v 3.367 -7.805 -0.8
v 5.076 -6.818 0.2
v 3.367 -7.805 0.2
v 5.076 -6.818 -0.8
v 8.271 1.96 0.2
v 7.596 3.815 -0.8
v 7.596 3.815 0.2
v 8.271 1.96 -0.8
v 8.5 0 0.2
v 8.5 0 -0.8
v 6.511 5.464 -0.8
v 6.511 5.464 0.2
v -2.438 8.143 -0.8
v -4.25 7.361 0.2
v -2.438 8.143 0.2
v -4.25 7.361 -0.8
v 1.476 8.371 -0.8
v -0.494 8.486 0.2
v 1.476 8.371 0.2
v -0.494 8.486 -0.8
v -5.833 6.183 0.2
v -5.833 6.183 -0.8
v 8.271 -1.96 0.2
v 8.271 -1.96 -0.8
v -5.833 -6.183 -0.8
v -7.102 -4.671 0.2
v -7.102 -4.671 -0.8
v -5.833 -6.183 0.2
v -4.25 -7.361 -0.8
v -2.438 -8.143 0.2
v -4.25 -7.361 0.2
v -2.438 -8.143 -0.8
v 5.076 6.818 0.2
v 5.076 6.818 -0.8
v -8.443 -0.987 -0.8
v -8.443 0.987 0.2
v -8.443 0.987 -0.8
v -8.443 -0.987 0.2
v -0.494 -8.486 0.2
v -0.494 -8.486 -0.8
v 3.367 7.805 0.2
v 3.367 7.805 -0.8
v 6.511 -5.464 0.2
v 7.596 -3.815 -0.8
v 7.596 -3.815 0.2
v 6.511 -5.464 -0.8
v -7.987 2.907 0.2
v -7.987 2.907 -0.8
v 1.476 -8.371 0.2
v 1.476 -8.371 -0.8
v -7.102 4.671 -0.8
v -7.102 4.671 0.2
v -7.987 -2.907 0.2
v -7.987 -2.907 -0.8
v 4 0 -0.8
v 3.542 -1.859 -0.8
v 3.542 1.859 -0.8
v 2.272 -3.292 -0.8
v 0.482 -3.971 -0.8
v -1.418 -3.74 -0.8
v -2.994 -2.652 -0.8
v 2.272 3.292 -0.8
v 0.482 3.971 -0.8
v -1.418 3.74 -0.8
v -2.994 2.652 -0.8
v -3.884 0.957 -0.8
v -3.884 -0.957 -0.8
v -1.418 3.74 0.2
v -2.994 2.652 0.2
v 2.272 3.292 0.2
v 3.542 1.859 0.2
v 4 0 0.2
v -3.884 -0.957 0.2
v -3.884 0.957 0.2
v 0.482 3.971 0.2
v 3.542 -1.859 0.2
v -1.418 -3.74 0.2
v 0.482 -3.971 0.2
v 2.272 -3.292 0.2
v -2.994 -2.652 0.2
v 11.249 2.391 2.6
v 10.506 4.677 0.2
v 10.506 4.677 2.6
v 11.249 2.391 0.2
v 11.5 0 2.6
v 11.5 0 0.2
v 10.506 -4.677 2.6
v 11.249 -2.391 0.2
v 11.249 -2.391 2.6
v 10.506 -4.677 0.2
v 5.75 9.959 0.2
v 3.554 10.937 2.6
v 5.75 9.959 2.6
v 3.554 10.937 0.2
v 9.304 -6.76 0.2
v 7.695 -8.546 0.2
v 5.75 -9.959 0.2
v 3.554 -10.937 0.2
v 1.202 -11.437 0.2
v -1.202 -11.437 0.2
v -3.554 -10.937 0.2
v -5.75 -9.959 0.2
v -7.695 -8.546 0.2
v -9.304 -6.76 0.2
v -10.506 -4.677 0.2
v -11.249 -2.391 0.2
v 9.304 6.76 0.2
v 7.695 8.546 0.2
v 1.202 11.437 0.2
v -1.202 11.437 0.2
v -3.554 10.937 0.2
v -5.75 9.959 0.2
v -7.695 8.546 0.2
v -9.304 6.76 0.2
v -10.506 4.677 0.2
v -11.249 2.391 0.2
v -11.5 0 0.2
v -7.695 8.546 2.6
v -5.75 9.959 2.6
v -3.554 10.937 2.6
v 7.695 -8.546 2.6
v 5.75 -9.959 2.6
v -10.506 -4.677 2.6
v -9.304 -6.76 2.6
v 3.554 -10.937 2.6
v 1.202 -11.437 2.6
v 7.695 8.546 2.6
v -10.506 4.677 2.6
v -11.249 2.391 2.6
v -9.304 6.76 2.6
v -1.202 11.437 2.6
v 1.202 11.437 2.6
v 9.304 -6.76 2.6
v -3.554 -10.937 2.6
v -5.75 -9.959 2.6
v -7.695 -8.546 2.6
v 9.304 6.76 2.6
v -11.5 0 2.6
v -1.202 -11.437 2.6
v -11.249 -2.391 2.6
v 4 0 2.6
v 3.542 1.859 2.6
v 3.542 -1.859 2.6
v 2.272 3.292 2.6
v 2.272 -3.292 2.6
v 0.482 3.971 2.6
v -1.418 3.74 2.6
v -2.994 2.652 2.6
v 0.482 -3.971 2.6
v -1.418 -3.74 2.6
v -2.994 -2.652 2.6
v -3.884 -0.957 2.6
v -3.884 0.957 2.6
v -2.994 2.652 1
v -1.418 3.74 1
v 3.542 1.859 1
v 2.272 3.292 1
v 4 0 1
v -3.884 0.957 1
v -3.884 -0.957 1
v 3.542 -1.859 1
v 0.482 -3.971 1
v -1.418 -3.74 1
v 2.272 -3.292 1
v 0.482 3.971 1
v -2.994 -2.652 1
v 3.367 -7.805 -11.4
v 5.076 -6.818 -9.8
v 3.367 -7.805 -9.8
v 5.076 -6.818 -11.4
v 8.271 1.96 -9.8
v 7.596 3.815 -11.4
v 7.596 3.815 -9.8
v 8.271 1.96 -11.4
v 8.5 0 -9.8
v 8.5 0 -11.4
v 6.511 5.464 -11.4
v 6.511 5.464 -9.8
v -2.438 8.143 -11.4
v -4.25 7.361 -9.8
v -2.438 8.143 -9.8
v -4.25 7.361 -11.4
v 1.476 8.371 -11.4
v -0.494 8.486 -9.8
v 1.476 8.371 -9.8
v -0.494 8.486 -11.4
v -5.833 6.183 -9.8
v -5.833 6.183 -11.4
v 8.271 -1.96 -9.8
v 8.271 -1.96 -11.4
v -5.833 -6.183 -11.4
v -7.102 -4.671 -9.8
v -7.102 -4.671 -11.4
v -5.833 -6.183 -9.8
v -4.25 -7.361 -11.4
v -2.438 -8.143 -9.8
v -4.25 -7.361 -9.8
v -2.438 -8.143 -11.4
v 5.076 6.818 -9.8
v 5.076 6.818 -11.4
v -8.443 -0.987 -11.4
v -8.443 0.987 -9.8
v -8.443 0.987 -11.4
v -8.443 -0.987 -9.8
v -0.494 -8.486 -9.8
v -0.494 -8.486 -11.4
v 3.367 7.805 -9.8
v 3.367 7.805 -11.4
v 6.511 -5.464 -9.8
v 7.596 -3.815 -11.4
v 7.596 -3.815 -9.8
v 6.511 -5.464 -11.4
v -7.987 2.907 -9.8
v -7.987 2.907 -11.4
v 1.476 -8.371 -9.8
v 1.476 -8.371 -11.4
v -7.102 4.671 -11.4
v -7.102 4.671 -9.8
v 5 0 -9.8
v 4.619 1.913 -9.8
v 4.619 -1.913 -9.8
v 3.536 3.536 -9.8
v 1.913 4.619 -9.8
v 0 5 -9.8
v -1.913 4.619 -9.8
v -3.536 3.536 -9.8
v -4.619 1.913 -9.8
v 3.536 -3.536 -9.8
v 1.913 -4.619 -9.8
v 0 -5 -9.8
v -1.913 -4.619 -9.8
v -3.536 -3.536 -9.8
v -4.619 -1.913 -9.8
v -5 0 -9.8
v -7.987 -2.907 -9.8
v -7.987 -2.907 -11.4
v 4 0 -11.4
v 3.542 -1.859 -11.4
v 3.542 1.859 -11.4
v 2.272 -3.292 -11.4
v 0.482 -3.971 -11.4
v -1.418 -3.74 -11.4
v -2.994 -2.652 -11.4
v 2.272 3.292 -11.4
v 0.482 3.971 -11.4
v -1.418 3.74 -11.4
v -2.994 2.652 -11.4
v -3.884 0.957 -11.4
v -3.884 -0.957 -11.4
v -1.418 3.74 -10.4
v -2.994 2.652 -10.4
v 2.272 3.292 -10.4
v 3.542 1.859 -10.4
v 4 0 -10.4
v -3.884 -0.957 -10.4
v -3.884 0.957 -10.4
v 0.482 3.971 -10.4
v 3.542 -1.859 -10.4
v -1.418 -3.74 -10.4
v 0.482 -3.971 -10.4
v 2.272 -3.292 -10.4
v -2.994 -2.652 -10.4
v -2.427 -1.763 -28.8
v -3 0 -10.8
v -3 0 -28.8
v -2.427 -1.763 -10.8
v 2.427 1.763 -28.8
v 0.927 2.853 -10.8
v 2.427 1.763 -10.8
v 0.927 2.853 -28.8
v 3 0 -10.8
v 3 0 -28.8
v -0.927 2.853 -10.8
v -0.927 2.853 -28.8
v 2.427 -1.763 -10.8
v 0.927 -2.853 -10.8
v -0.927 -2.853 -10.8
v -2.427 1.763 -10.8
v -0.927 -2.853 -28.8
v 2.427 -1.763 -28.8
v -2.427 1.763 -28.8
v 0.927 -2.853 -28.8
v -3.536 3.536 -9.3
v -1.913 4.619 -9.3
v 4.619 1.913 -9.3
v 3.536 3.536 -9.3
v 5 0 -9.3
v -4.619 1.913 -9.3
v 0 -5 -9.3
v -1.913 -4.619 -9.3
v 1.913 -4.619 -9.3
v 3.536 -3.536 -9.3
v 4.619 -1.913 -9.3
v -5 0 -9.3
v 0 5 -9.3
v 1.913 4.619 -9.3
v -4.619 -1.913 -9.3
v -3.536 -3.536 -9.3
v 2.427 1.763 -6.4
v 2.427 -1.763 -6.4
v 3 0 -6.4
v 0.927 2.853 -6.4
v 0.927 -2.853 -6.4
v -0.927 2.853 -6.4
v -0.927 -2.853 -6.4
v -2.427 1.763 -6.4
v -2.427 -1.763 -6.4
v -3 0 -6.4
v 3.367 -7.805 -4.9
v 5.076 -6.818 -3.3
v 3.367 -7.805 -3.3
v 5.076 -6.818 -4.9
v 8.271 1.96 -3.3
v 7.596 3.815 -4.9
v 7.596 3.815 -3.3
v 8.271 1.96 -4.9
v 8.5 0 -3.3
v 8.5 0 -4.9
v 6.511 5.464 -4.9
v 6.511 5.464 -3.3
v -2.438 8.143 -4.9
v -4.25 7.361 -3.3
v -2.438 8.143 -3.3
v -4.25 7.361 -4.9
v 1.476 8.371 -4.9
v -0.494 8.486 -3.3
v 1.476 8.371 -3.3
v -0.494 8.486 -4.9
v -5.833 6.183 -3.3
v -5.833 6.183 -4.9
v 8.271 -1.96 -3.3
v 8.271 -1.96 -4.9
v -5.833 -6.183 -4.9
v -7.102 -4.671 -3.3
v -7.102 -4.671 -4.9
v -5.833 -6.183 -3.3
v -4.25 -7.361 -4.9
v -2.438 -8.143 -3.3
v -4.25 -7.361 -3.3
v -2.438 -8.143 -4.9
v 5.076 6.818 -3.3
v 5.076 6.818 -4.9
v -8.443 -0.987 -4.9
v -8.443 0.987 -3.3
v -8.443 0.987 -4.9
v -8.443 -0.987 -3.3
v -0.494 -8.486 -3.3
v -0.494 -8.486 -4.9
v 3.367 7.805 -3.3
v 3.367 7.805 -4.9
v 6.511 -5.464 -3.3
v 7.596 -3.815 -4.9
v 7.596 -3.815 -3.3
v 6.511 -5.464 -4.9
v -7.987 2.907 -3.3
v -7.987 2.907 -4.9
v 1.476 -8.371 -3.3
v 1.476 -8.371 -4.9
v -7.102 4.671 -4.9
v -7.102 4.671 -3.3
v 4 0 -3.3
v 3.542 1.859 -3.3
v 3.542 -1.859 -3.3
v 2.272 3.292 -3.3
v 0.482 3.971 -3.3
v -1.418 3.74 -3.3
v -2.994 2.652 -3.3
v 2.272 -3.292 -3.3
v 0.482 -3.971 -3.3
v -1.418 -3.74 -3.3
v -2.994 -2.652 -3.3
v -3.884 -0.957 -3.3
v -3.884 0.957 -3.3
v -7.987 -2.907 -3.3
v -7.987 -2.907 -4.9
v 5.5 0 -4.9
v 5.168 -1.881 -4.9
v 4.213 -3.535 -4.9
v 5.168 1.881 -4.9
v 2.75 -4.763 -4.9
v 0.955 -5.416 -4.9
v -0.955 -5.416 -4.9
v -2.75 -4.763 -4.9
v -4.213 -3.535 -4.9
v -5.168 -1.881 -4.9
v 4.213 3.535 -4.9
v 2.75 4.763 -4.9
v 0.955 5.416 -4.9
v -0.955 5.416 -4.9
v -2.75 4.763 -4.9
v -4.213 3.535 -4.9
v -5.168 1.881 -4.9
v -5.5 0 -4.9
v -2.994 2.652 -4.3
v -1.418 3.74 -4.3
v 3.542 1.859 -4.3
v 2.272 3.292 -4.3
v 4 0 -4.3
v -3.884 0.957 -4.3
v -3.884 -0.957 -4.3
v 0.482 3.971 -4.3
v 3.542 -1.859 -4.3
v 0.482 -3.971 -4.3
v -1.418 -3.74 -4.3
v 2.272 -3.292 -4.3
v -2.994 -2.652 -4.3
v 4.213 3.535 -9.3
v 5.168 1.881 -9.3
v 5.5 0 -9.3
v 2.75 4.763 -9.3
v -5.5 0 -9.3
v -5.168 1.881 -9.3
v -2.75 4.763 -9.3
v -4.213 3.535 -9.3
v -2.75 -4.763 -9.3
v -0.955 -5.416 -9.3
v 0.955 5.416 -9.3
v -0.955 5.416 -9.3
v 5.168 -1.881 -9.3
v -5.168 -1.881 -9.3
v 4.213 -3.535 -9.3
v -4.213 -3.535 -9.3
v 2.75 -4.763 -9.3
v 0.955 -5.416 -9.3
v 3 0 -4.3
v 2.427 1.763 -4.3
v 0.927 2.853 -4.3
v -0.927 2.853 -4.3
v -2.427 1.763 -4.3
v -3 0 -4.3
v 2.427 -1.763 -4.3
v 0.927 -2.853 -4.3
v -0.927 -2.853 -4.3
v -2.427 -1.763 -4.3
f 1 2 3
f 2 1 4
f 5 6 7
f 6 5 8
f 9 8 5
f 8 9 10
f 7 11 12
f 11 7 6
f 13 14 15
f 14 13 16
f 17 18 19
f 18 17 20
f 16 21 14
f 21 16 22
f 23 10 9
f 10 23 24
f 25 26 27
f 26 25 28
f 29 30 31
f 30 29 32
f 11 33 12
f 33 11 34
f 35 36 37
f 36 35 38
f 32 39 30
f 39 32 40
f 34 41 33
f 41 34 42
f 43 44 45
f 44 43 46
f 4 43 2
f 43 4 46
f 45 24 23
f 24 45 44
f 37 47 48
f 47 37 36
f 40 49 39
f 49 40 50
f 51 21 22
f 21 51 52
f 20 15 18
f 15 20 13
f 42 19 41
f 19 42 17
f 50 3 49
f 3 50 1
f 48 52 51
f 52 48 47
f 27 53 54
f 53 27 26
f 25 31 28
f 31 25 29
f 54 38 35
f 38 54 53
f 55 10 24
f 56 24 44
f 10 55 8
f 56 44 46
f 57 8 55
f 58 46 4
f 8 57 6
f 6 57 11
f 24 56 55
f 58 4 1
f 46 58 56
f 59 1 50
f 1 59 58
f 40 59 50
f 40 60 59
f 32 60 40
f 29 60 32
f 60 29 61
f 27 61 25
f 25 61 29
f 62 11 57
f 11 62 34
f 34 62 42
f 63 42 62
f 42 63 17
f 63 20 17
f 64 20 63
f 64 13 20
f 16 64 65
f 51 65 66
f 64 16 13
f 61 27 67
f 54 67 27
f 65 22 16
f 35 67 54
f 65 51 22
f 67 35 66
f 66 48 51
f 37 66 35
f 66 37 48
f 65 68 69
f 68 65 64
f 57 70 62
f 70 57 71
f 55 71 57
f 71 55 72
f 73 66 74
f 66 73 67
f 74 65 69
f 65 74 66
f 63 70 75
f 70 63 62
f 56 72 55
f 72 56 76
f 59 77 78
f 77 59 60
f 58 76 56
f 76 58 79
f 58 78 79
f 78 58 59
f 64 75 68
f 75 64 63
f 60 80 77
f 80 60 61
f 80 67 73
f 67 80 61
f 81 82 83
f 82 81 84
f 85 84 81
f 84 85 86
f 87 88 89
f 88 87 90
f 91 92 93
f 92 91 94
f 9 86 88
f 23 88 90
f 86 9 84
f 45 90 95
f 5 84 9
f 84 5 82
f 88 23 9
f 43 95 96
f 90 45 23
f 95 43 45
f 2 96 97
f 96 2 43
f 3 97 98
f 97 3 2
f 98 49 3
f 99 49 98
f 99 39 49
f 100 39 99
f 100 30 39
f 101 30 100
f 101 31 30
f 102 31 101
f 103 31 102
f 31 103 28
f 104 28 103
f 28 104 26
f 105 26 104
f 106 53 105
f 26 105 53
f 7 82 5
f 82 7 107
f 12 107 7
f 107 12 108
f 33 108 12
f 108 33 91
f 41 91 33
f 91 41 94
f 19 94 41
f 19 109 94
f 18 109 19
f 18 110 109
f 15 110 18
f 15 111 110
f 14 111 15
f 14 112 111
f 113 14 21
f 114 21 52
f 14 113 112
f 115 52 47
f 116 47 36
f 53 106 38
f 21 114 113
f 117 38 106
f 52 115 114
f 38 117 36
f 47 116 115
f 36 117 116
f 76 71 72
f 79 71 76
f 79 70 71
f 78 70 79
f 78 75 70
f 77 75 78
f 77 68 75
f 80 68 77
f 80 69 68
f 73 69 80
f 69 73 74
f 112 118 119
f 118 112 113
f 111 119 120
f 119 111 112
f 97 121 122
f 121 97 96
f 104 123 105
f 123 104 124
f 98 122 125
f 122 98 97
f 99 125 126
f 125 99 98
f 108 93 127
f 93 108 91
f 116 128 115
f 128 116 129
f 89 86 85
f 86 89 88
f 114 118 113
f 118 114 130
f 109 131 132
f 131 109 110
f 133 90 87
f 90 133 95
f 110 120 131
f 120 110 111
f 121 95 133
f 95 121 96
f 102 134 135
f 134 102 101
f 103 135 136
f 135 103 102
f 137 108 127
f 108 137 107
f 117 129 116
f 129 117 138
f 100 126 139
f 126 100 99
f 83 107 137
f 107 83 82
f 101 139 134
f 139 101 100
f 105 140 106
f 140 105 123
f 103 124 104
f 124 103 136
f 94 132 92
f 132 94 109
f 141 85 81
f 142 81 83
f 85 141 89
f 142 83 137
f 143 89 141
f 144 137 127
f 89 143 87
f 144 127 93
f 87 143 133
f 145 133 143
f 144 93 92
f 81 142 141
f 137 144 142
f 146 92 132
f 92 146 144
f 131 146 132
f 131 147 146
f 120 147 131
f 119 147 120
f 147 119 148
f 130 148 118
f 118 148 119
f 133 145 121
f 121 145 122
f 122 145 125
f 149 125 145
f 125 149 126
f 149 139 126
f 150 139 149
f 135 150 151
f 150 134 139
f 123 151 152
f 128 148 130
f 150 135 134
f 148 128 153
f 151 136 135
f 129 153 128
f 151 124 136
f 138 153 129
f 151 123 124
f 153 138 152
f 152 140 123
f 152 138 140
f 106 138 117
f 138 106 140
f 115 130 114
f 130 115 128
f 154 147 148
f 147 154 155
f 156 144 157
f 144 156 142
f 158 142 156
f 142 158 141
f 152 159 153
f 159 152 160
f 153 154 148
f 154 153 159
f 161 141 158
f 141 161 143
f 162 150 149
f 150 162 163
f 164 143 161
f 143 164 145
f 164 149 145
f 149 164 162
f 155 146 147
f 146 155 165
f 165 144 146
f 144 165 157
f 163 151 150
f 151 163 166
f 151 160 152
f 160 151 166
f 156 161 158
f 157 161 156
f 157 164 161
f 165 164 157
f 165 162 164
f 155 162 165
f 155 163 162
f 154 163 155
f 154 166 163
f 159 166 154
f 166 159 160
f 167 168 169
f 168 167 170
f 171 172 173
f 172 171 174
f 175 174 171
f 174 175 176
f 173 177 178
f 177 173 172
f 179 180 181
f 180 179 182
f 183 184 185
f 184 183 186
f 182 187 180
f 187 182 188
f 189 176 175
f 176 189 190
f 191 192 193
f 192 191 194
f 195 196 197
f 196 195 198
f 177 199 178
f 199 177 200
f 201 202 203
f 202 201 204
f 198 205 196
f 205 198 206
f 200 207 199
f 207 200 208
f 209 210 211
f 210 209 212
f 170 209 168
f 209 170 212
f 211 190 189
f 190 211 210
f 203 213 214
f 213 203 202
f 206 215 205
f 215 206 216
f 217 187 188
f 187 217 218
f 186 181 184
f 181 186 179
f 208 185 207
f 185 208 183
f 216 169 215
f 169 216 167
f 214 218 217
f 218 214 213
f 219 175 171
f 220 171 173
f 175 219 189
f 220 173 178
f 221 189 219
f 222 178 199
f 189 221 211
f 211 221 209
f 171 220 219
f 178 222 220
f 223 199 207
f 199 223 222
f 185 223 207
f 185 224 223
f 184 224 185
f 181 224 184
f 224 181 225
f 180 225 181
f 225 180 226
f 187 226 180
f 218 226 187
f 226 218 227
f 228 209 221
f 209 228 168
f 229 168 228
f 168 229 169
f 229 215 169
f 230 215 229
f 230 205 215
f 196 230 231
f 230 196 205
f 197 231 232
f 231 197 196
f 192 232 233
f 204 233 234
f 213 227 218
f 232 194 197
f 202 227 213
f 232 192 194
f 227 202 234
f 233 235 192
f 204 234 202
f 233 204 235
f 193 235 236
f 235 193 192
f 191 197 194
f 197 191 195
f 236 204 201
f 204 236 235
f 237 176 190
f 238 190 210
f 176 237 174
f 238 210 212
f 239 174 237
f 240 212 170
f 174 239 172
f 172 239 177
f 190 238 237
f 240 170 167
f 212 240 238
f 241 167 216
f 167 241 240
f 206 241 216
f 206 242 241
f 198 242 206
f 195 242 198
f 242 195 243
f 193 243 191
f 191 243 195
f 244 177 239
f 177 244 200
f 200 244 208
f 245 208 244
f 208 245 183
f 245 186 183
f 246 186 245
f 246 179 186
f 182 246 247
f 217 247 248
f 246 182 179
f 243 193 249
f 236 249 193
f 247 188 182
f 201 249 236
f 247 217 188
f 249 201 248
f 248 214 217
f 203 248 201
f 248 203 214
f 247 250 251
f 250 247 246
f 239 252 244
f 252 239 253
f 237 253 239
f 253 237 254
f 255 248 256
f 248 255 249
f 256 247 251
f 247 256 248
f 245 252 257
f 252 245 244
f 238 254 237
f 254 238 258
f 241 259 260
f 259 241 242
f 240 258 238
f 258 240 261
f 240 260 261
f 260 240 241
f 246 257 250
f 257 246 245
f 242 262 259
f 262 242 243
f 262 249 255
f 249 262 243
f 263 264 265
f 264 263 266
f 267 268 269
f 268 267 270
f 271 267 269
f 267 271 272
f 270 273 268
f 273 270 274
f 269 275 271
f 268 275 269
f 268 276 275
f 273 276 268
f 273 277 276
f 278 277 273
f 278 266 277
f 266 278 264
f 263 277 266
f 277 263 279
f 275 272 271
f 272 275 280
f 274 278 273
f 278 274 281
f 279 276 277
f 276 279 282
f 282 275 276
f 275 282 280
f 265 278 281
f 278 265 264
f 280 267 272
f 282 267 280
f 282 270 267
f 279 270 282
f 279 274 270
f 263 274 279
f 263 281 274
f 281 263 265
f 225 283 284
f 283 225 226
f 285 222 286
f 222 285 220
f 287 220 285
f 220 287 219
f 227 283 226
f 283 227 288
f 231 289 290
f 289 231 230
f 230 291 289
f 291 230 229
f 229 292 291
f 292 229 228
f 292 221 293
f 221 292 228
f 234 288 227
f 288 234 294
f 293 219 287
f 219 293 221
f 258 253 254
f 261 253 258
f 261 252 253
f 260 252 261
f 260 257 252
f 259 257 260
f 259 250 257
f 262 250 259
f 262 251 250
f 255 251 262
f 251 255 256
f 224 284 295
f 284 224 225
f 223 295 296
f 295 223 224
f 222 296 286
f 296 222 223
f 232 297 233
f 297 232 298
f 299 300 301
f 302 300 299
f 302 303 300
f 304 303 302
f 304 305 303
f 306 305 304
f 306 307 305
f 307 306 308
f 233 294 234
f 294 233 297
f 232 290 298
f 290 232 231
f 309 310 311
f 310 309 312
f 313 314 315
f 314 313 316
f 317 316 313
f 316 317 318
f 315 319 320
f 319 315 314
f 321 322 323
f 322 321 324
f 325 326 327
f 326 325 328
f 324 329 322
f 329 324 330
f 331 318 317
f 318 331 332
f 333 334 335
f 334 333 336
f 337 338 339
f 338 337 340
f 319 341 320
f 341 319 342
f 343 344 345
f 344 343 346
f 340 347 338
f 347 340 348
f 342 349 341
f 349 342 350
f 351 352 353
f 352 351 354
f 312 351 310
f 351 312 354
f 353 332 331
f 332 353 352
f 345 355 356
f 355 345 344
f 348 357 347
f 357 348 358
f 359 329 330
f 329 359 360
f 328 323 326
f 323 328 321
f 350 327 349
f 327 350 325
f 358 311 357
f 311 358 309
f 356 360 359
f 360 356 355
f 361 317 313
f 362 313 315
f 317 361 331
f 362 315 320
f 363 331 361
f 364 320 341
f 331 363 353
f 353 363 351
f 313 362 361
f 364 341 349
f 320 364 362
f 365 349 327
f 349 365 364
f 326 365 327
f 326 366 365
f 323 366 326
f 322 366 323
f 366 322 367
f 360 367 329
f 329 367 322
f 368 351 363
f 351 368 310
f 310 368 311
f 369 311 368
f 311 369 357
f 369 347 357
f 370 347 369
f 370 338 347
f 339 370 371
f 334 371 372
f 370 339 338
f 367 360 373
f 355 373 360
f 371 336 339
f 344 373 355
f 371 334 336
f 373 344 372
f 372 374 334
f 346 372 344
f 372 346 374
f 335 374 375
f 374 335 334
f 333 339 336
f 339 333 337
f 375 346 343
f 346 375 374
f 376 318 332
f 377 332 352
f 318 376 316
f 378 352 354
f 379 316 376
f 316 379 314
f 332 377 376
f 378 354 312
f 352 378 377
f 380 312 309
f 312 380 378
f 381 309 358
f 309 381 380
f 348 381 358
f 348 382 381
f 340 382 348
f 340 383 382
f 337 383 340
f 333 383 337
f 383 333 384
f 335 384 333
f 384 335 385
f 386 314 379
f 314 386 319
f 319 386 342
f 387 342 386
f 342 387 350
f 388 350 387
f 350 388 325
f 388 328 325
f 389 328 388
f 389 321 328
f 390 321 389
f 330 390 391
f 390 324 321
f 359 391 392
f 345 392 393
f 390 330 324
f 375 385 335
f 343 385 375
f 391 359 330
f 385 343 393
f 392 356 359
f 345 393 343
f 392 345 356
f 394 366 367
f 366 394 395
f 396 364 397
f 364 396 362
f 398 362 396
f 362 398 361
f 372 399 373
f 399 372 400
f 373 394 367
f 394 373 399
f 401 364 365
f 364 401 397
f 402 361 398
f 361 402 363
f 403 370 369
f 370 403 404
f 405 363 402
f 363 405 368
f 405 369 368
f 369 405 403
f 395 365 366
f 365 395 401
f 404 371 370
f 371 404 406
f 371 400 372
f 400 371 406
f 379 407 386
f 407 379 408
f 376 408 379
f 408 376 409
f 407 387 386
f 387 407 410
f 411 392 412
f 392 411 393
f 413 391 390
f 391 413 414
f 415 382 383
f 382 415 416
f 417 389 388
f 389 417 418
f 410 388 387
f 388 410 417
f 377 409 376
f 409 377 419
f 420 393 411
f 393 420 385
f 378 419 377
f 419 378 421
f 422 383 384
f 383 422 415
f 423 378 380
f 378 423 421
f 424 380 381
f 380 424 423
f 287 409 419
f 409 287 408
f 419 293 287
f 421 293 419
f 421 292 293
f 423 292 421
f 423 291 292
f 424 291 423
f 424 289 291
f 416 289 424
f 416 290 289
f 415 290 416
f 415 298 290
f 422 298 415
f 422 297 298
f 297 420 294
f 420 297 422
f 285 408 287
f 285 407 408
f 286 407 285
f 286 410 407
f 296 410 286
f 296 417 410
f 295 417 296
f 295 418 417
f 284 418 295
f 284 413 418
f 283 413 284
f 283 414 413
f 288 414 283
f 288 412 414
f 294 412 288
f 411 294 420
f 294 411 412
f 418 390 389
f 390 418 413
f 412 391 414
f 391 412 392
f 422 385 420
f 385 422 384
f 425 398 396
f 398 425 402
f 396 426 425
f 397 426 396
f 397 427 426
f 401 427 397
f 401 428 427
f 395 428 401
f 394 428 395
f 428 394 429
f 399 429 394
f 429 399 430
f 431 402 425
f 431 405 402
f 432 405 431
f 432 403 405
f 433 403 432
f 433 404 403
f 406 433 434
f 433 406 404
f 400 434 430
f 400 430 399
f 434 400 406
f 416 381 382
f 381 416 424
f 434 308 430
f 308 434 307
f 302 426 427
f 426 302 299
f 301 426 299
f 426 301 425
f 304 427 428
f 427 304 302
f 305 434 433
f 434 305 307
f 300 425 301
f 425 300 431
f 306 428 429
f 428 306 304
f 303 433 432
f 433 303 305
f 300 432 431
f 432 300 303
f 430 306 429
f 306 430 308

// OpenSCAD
// Parameters
inner_diameter_mm = 8; //[4:16:0.1]
outer_diameter_mm = 17; //[8.5:34:0.1]
thickness_mm = 1.6; //[0.8:3.2:0.1]
eps_mm = 0.6; //[0.2:2:0.1]
grommet_flange_extra_d_mm = 6; //[3:12:0.5]
grommet_top_height_mm = 2.4; //[1.2:6:0.1]
grommet_lip_height_mm = 0.8; //[0.4:2:0.1]
screw_shank_d_mm = 6; //[3:12:0.1]
screw_shank_len_mm = 18; //[9:36:0.5]
screw_head_d_mm = 10; //[5:20:0.1]
screw_head_h_mm = 4; //[2:8:0.1]
nut_flat_d_mm = 11; //[5.5:22:0.1]
nut_h_mm = 5; //[2.5:10:0.1]

// Washer - base geometry
module washer_body() {
  color("Silver") difference() {
    cylinder(r=outer_diameter_mm/2, h=thickness_mm, center=true);
    cylinder(r=inner_diameter_mm/2, h=thickness_mm + 2*eps_mm, center=true);
  }
}

// Round Grommet Top - detailed geometry
module round_grommet_top() {
  color([0.2, 0.2, 0.2]) union() {
    difference() {
      cylinder(r=(outer_diameter_mm + grommet_flange_extra_d_mm)/2, h=grommet_top_height_mm, center=true);
      cylinder(r=inner_diameter_mm/2, h=grommet_top_height_mm + 2*eps_mm, center=true);
    }
    translate([0, 0, -grommet_top_height_mm/2 + grommet_lip_height_mm/2])
      cylinder(r=(inner_diameter_mm/2) + eps_mm, h=grommet_lip_height_mm, center=true);
  }
}

// Round Grommet Assembly - combines washer and grommet top
module round_grommet_assembly() {
  union() {
    washer_body();
    translate([0, 0, thickness_mm/2 + grommet_top_height_mm/2 - eps_mm])
      round_grommet_top();
  }
}

// Screw And Washer - detailed geometry
module screw_and_washer() {
  union() {
    washer_body();
    color("DimGray") {
      translate([0, 0, -(thickness_mm/2 + screw_shank_len_mm/2 - eps_mm)])
        cylinder(r=screw_shank_d_mm/2, h=screw_shank_len_mm, center=true);
      translate([0, 0, thickness_mm/2 + screw_head_h_mm/2 - eps_mm])
        cylinder(r=screw_head_d_mm/2, h=screw_head_h_mm, center=true);
    }
  }
}

// Nut And Washer - detailed geometry
module nut_and_washer() {
  union() {
    washer_body();
    color("DimGray") difference() {
      translate([0, 0, -(thickness_mm/2 + nut_h_mm/2 - eps_mm)])
        cylinder(r=nut_flat_d_mm/2, h=nut_h_mm, center=true);
      translate([0, 0, -(thickness_mm/2 + nut_h_mm/2 - eps_mm)])
        cylinder(r=screw_shank_d_mm/2, h=nut_h_mm + 2*eps_mm, center=true);
    }
  }
}

// Final Assembly
module assembly() {
  translate([0, 0, 0]) round_grommet_assembly();
  translate([0, 0, -thickness_mm - screw_shank_len_mm/2]) screw_and_washer();
  translate([0, 0, -thickness_mm - nut_h_mm/2]) nut_and_washer();
}

assembly();
